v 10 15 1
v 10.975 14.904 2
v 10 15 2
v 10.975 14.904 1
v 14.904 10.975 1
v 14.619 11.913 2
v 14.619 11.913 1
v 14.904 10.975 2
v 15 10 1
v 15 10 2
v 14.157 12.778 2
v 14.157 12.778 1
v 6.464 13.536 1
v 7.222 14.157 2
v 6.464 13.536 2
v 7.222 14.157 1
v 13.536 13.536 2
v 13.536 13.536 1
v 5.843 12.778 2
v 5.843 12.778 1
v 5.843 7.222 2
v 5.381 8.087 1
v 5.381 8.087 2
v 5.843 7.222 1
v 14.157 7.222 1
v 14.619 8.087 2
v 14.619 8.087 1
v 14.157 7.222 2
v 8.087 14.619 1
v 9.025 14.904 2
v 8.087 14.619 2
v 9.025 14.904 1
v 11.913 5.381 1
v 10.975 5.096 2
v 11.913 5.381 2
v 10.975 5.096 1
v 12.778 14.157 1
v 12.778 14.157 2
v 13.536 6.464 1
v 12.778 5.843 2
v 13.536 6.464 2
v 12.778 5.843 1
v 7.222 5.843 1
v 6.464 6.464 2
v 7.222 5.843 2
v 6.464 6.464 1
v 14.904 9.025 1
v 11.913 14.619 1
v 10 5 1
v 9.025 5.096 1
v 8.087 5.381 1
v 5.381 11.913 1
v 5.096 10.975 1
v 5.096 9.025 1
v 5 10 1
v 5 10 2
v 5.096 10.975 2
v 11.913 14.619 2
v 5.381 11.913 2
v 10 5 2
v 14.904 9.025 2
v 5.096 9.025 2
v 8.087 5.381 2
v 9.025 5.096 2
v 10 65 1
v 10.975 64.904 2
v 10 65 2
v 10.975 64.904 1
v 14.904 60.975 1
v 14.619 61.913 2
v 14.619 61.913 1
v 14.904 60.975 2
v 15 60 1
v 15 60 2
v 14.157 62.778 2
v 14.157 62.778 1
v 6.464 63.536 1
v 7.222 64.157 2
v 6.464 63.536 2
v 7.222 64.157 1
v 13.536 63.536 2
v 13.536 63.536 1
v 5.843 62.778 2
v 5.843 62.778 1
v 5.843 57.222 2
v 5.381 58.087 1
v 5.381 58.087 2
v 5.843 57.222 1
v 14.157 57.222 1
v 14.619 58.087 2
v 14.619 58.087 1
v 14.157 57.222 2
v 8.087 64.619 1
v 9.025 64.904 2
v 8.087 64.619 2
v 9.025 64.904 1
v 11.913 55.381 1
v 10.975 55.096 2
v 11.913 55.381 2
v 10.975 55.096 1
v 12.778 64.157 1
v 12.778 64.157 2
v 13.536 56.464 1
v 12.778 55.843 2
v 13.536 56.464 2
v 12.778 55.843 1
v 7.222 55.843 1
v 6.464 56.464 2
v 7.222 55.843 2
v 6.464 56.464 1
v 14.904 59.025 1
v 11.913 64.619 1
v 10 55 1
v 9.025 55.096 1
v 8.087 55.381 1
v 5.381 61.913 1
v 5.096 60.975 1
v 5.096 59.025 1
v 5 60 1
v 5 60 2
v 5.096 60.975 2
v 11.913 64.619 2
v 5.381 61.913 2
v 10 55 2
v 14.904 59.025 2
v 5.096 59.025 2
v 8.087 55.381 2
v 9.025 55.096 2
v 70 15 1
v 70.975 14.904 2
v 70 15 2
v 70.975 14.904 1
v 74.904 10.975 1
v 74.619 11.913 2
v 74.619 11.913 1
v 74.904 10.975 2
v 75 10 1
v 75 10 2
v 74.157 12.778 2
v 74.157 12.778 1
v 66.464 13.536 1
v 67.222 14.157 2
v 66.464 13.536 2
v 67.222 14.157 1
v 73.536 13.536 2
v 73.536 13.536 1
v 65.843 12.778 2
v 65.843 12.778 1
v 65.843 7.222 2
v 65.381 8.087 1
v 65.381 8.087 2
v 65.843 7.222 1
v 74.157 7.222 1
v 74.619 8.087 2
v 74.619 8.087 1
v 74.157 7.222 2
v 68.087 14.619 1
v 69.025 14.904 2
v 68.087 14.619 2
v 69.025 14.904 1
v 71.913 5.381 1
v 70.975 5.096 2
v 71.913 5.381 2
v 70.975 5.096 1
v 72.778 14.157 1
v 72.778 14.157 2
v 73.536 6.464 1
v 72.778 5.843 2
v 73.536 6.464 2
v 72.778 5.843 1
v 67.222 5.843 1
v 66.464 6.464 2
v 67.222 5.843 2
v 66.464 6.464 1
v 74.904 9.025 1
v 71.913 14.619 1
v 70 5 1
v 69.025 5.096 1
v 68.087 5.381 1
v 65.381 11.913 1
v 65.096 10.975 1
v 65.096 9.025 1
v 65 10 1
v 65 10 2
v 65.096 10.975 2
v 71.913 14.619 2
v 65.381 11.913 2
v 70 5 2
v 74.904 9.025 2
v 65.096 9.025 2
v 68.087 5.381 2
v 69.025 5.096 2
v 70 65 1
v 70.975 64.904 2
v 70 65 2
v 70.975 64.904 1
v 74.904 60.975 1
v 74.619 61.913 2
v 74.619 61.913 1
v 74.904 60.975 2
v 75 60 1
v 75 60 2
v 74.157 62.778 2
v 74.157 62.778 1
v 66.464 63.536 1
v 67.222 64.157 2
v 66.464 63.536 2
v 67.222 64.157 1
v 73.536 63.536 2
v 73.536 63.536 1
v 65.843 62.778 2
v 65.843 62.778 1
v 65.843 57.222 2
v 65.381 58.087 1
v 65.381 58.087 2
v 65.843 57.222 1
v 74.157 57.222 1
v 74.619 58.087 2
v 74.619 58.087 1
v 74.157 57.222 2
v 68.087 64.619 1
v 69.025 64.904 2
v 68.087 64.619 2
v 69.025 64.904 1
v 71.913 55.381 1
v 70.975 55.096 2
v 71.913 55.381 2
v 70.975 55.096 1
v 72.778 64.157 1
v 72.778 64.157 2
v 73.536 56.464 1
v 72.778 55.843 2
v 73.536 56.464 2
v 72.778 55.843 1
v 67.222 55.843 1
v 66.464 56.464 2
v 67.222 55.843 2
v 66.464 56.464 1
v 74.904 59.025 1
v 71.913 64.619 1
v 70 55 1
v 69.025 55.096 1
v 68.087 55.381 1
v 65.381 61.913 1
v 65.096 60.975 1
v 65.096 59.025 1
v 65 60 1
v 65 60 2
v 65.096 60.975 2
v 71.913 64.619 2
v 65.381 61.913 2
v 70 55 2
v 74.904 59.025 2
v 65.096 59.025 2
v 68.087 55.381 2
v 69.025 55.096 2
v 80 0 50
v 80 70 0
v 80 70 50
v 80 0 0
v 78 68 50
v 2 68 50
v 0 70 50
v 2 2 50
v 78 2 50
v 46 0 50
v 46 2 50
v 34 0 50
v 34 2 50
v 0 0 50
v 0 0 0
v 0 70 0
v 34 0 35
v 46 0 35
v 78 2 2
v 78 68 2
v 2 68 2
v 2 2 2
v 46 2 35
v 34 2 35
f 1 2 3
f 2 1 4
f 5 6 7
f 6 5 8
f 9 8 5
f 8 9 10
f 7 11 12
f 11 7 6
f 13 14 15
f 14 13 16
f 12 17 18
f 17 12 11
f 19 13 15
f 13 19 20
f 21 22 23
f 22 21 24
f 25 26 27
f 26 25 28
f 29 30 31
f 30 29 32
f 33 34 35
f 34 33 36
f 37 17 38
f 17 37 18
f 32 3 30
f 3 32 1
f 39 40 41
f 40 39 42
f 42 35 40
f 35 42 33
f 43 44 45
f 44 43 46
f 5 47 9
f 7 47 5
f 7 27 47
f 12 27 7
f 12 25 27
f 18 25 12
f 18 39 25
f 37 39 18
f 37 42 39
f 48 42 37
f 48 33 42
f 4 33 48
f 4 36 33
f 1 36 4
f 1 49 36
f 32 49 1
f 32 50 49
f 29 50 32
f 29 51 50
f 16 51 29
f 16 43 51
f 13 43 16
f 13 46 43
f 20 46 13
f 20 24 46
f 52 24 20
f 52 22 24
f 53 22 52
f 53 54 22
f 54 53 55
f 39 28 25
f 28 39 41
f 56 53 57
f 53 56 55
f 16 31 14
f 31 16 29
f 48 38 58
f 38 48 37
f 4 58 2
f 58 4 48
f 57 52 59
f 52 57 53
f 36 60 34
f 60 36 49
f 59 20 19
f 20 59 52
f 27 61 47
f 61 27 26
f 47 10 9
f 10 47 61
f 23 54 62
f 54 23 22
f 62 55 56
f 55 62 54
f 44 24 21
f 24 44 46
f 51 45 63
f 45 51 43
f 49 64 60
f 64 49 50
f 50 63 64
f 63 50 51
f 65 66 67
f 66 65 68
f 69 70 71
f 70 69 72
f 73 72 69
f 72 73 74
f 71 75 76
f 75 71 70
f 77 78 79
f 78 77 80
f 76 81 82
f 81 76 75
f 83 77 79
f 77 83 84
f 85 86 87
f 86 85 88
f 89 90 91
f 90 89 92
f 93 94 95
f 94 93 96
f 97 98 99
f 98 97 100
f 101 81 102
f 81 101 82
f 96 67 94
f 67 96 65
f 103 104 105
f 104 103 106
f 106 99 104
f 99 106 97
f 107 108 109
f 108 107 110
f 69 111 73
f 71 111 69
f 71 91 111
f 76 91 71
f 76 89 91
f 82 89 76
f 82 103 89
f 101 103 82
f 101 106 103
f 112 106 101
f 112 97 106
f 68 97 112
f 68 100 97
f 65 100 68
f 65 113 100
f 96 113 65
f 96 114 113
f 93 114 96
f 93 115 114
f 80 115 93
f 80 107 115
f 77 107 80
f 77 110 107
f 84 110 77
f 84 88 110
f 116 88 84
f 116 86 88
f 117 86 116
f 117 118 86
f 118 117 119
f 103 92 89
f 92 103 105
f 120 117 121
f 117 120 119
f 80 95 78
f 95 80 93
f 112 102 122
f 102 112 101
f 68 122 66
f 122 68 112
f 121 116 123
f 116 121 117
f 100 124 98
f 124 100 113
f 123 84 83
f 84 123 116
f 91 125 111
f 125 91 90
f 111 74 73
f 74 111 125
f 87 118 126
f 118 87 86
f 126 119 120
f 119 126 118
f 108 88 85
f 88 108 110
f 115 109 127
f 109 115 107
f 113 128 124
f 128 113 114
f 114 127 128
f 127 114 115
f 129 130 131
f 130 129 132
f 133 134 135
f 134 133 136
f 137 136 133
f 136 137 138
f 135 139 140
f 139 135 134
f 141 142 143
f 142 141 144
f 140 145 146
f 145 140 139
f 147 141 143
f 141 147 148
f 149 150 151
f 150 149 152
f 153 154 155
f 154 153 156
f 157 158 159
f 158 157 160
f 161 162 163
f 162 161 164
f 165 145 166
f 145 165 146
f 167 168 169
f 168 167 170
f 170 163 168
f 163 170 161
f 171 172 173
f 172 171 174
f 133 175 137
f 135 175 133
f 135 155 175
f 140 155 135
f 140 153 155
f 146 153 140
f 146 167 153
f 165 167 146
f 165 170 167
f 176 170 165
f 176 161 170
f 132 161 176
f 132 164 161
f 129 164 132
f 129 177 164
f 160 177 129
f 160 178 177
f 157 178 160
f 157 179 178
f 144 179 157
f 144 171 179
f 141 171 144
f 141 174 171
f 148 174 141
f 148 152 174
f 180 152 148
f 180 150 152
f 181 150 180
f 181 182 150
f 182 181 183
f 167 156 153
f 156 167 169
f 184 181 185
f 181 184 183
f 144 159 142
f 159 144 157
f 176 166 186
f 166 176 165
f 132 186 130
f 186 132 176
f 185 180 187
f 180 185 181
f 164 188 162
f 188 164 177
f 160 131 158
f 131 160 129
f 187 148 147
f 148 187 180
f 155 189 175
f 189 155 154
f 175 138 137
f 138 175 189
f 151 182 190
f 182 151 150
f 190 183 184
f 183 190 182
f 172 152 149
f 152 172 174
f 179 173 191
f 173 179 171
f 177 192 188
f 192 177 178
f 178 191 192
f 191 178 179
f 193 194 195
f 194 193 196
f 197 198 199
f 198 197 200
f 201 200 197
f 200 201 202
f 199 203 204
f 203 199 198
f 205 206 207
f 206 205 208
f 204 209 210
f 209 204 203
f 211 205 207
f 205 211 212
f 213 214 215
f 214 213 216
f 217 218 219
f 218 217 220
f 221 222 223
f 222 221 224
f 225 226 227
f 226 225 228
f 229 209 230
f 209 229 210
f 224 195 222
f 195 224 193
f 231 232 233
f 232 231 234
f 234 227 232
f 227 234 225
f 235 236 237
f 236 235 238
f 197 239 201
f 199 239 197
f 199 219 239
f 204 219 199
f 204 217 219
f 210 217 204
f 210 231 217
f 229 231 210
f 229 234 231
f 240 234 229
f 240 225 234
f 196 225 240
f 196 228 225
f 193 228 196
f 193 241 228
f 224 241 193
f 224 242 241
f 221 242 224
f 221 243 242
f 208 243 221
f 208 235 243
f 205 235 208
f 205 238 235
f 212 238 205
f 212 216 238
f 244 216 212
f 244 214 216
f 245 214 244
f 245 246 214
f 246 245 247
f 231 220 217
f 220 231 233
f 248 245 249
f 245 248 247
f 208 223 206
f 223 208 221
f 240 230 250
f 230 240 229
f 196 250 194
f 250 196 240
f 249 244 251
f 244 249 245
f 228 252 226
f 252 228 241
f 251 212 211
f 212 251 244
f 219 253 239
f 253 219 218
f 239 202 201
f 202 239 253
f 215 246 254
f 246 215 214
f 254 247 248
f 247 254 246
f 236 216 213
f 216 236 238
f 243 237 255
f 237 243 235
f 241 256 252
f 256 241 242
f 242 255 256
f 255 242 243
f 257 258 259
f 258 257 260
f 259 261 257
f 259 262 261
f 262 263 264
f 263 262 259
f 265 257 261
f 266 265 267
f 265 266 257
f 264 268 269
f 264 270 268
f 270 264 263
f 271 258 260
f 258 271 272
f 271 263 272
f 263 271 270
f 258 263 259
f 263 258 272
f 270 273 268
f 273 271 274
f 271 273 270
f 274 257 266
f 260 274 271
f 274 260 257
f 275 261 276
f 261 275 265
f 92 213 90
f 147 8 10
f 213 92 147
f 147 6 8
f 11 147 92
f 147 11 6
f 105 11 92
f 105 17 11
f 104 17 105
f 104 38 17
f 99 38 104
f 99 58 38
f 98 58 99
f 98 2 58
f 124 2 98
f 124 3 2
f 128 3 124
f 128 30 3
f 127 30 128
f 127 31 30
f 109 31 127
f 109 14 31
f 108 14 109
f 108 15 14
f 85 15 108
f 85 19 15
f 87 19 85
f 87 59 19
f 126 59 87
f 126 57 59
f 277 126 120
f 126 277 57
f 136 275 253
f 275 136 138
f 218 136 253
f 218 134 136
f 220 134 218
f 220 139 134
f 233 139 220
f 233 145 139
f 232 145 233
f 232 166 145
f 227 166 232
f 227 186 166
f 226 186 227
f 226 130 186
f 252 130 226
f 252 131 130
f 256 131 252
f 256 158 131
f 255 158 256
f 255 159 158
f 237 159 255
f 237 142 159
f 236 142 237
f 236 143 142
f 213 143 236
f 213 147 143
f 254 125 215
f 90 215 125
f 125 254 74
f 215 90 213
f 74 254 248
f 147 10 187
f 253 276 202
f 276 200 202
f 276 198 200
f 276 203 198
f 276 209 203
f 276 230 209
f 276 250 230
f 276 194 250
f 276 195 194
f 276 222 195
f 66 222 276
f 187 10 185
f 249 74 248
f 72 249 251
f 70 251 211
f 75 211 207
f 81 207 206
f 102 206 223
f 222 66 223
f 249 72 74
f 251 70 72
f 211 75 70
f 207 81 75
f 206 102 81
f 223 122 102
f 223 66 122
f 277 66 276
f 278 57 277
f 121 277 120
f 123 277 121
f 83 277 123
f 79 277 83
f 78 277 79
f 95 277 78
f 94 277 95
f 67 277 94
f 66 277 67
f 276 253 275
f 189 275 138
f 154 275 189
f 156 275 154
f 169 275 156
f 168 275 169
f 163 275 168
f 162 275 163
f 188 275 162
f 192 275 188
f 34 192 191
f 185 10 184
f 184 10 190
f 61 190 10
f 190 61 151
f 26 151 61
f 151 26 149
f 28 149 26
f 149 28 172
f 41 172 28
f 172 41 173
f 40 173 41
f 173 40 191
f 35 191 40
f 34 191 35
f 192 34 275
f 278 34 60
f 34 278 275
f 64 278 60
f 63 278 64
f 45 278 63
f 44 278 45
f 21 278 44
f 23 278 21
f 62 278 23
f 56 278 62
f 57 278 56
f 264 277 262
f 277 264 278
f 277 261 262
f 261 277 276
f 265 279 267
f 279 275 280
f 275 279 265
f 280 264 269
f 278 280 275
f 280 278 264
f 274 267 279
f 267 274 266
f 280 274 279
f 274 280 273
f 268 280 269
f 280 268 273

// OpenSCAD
$fn = 32;

// ----------------------------------------------------------------------
// Enclosure box: both enclosure
// ----------------------------------------------------------------------

// --- parameters (mm) ---
box_l = 80;               // outer length, X
box_w = 70;               // outer width, Y
box_h = 50;               // outer height
wall_t = 2;               // wall thickness
boss_r = 5;               // corner boss radius
hole_r = 1.5;             // boss screw hole radius
boss_in = 10;             // boss inset from the corners
notch_w = 12;             // cable notch width
notch_h = 15;             // cable notch height

inner_h = box_h - wall_t;  // cavity depth
boss_h = inner_h - 2;  // corner boss height

difference() {
  cube([box_l, box_w, box_h]);
  translate([wall_t, wall_t, wall_t])
    cube([box_l - 2 * wall_t, box_w - 2 * wall_t, box_h]);
  for (sx = [0, 1], sy = [0, 1])
    translate([sx ? box_l - boss_in : boss_in,
               sy ? box_w - boss_in : boss_in, wall_t - 1]) {
      cylinder(r = boss_r, h = boss_h);
      translate([0, 0, boss_h - 4])
        cylinder(r = hole_r, h = 5);
    }
  translate([box_l / 2 - notch_w / 2, -1, box_h - notch_h])
    cube([notch_w, wall_t + 2, notch_h + 1]);
}
